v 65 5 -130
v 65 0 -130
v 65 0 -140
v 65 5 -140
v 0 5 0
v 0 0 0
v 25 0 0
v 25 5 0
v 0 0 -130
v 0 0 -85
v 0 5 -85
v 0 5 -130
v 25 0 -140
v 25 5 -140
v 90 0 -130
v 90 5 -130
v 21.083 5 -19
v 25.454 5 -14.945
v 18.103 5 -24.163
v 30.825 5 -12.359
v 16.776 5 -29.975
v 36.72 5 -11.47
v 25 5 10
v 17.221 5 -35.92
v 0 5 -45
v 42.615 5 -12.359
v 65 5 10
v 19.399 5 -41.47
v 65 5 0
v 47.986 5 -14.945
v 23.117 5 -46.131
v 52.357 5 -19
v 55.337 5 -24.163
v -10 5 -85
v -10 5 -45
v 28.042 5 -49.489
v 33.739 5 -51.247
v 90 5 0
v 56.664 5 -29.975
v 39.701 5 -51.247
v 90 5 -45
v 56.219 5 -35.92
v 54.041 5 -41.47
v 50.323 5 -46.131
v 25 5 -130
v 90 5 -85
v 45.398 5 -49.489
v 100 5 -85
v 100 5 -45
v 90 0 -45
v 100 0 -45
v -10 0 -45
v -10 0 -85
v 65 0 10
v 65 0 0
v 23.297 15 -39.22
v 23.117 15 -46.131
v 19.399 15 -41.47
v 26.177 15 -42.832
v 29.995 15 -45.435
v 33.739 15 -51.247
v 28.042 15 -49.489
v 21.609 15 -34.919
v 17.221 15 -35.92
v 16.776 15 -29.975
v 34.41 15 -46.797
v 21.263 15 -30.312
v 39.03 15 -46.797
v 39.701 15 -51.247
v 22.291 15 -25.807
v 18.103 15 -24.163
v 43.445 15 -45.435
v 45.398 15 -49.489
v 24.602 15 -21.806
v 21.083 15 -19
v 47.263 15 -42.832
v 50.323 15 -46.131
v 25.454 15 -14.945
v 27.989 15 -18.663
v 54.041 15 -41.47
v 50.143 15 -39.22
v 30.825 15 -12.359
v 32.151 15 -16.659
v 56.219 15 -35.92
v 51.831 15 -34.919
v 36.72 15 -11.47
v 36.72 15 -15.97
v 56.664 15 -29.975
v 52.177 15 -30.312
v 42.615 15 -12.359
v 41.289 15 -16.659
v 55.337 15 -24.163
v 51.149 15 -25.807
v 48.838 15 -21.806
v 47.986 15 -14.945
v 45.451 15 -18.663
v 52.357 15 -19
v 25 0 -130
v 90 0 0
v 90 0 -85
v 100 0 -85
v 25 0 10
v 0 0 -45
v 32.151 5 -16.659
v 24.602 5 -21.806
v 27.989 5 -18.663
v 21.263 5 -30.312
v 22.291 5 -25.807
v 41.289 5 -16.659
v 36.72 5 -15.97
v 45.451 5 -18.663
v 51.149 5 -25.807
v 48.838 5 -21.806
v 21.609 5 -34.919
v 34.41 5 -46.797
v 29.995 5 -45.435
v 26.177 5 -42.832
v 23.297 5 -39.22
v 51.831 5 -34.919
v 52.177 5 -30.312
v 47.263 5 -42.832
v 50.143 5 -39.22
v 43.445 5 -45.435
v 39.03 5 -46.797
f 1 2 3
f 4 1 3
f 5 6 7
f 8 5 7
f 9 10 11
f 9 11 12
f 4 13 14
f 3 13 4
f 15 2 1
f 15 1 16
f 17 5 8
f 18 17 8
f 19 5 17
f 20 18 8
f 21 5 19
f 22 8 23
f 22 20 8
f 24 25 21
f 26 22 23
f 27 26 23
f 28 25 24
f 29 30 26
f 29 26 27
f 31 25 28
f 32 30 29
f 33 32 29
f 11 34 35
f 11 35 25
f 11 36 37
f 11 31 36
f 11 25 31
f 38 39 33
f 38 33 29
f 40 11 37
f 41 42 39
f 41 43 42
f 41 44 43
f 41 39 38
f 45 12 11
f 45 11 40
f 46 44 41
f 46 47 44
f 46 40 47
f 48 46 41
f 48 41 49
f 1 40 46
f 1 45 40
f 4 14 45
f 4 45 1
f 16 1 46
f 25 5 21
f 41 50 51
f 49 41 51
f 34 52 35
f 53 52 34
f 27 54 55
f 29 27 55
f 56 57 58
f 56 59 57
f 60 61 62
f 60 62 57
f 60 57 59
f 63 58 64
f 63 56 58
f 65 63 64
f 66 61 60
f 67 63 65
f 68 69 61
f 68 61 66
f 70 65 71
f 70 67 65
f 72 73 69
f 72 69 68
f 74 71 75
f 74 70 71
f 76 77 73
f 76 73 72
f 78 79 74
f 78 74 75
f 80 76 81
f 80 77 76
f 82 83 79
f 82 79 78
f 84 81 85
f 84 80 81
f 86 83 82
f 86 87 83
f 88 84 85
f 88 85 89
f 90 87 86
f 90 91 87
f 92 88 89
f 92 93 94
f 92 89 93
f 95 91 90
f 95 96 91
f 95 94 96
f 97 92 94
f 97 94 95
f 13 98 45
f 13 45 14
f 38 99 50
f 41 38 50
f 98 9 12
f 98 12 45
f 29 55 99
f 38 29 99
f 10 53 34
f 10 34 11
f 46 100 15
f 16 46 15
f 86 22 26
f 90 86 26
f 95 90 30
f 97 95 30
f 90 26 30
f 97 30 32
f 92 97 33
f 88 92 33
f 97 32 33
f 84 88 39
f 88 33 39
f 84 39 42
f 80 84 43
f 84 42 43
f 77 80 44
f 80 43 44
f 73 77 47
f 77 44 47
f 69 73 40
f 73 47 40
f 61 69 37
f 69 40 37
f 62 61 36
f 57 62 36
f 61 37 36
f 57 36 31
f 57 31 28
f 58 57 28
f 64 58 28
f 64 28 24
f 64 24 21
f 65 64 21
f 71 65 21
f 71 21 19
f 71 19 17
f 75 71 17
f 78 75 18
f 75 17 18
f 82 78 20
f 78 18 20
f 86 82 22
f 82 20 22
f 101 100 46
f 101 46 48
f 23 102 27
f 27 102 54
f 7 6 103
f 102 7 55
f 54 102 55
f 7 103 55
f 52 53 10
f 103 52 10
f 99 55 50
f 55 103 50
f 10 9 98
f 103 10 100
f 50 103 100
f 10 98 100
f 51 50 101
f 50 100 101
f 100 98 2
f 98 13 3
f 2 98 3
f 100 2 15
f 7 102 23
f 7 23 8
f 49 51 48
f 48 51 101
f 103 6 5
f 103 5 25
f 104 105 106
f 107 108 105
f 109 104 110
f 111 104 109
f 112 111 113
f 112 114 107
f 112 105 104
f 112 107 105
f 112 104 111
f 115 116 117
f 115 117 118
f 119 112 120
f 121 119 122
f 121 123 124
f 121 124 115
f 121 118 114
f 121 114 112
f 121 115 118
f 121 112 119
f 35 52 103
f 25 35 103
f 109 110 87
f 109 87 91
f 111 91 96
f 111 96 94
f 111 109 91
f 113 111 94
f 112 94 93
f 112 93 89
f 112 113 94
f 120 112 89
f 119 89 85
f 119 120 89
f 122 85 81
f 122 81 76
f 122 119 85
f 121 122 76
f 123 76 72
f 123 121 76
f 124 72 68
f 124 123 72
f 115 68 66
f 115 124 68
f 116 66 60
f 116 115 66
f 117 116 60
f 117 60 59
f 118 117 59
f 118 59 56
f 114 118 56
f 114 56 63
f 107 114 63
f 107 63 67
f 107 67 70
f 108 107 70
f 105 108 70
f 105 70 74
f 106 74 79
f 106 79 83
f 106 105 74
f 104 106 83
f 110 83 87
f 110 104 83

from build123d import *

# Parameters (mm, degrees)
SKETCH1_W           = 90
SKETCH1_H           = 130
SKETCH1_W_2         = 10
SKETCH1_H_2         = 40
SKETCH1_W_3         = 40
SKETCH1_H_3         = 10
BOSS_EXTRUDE1_DEPTH = 5
SKETCH4_R           = 20
SKETCH4_R_2         = 15.5
BOSS_EXTRUDE2_DEPTH = 10


with BuildPart() as part:
    # Sketch1 → Boss-Extrude1 (new body)
    with BuildSketch(Plane(origin=(0, 0, 0), x_dir=(1, 0, 0), z_dir=(0, 1, 0))):
        with Locations((45, 65)):
            Rectangle(SKETCH1_W, SKETCH1_H)
        with Locations((-5, 65)):
            Rectangle(SKETCH1_W_2, SKETCH1_H_2)
        with Locations((95, 65)):
            Rectangle(SKETCH1_W_2, SKETCH1_H_2)
        with Locations((45, -5)):
            Rectangle(SKETCH1_W_3, SKETCH1_H_3)
        with Locations((45, 135)):
            Rectangle(SKETCH1_W_3, SKETCH1_H_3)
    extrude(amount=BOSS_EXTRUDE1_DEPTH)

    # Sketch4 → Boss-Extrude2 (add)
    with BuildSketch(Plane(origin=(0, 5, 0), x_dir=(1, 0, 0), z_dir=(0, 1, 0))):
        with Locations(Location((36.72, 31.47, 0), (0, 0, 270))):
            Circle(SKETCH4_R)
        with Locations(Location((36.72, 31.47, 0), (0, 0, 270))):
            Circle(SKETCH4_R_2, mode=Mode.SUBTRACT)
    extrude(amount=BOSS_EXTRUDE2_DEPTH)


solid = part.part
